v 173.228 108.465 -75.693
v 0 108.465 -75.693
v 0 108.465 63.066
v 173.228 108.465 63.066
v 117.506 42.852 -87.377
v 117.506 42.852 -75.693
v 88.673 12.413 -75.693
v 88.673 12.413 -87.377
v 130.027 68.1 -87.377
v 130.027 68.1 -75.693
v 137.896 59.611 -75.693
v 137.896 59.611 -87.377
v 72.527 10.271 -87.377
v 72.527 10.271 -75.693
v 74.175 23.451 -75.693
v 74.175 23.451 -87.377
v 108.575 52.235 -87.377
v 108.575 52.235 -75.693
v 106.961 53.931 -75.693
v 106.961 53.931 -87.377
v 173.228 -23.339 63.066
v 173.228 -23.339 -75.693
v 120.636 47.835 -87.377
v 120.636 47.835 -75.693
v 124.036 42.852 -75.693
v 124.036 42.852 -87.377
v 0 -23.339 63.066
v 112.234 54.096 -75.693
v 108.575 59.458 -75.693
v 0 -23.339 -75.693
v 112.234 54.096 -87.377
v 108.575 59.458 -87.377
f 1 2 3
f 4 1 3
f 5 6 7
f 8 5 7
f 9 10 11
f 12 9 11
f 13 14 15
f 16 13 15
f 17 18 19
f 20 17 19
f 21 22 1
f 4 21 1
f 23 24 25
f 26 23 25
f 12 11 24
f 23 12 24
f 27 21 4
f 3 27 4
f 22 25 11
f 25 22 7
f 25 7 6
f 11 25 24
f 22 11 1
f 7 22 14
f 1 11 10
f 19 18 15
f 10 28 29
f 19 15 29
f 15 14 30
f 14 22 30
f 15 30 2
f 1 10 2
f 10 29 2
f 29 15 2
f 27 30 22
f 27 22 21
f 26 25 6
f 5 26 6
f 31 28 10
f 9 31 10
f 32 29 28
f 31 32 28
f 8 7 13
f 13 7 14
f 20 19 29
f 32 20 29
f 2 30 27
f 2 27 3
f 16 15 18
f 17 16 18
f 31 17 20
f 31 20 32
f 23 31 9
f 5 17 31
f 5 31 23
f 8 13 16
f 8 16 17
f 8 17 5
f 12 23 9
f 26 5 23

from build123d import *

# Parameters (mm, degrees)
F0_W     = 131.804712
F0_H     = 138.758264
F1_DEPTH = 173.228
F3_DEPTH = 11.684


with BuildPart() as f1:
    # F0 (on Right) → F1 (new body)
    with BuildSketch(Plane.YZ):
        with Locations((42.563114, -6.31338)):
            Rectangle(F0_W, F0_H)
    extrude(amount=F1_DEPTH)

    # F2 (on face) → F3 (join)
    with BuildSketch(Plane(origin=(0, 0, -75.692512), x_dir=(1, 0, 0), z_dir=(0, 0, -1))):
        Polygon((108.57549, -52.235217), (117.505729, -42.851768), (88.673443, -12.412787), (72.527371, -10.27096), (74.174926, -23.451431), align=None)
        Polygon((130.027175, -68.100274), (137.895701, -59.610553), (120.636091, -47.835302), (124.036072, -42.851768), (117.505729, -42.851768), (108.57549, -52.235217), (106.961355, -53.93127), (108.57549, -59.457818), (112.233534, -54.096028), align=None)
    extrude(amount=F3_DEPTH)


solid = f1.part
